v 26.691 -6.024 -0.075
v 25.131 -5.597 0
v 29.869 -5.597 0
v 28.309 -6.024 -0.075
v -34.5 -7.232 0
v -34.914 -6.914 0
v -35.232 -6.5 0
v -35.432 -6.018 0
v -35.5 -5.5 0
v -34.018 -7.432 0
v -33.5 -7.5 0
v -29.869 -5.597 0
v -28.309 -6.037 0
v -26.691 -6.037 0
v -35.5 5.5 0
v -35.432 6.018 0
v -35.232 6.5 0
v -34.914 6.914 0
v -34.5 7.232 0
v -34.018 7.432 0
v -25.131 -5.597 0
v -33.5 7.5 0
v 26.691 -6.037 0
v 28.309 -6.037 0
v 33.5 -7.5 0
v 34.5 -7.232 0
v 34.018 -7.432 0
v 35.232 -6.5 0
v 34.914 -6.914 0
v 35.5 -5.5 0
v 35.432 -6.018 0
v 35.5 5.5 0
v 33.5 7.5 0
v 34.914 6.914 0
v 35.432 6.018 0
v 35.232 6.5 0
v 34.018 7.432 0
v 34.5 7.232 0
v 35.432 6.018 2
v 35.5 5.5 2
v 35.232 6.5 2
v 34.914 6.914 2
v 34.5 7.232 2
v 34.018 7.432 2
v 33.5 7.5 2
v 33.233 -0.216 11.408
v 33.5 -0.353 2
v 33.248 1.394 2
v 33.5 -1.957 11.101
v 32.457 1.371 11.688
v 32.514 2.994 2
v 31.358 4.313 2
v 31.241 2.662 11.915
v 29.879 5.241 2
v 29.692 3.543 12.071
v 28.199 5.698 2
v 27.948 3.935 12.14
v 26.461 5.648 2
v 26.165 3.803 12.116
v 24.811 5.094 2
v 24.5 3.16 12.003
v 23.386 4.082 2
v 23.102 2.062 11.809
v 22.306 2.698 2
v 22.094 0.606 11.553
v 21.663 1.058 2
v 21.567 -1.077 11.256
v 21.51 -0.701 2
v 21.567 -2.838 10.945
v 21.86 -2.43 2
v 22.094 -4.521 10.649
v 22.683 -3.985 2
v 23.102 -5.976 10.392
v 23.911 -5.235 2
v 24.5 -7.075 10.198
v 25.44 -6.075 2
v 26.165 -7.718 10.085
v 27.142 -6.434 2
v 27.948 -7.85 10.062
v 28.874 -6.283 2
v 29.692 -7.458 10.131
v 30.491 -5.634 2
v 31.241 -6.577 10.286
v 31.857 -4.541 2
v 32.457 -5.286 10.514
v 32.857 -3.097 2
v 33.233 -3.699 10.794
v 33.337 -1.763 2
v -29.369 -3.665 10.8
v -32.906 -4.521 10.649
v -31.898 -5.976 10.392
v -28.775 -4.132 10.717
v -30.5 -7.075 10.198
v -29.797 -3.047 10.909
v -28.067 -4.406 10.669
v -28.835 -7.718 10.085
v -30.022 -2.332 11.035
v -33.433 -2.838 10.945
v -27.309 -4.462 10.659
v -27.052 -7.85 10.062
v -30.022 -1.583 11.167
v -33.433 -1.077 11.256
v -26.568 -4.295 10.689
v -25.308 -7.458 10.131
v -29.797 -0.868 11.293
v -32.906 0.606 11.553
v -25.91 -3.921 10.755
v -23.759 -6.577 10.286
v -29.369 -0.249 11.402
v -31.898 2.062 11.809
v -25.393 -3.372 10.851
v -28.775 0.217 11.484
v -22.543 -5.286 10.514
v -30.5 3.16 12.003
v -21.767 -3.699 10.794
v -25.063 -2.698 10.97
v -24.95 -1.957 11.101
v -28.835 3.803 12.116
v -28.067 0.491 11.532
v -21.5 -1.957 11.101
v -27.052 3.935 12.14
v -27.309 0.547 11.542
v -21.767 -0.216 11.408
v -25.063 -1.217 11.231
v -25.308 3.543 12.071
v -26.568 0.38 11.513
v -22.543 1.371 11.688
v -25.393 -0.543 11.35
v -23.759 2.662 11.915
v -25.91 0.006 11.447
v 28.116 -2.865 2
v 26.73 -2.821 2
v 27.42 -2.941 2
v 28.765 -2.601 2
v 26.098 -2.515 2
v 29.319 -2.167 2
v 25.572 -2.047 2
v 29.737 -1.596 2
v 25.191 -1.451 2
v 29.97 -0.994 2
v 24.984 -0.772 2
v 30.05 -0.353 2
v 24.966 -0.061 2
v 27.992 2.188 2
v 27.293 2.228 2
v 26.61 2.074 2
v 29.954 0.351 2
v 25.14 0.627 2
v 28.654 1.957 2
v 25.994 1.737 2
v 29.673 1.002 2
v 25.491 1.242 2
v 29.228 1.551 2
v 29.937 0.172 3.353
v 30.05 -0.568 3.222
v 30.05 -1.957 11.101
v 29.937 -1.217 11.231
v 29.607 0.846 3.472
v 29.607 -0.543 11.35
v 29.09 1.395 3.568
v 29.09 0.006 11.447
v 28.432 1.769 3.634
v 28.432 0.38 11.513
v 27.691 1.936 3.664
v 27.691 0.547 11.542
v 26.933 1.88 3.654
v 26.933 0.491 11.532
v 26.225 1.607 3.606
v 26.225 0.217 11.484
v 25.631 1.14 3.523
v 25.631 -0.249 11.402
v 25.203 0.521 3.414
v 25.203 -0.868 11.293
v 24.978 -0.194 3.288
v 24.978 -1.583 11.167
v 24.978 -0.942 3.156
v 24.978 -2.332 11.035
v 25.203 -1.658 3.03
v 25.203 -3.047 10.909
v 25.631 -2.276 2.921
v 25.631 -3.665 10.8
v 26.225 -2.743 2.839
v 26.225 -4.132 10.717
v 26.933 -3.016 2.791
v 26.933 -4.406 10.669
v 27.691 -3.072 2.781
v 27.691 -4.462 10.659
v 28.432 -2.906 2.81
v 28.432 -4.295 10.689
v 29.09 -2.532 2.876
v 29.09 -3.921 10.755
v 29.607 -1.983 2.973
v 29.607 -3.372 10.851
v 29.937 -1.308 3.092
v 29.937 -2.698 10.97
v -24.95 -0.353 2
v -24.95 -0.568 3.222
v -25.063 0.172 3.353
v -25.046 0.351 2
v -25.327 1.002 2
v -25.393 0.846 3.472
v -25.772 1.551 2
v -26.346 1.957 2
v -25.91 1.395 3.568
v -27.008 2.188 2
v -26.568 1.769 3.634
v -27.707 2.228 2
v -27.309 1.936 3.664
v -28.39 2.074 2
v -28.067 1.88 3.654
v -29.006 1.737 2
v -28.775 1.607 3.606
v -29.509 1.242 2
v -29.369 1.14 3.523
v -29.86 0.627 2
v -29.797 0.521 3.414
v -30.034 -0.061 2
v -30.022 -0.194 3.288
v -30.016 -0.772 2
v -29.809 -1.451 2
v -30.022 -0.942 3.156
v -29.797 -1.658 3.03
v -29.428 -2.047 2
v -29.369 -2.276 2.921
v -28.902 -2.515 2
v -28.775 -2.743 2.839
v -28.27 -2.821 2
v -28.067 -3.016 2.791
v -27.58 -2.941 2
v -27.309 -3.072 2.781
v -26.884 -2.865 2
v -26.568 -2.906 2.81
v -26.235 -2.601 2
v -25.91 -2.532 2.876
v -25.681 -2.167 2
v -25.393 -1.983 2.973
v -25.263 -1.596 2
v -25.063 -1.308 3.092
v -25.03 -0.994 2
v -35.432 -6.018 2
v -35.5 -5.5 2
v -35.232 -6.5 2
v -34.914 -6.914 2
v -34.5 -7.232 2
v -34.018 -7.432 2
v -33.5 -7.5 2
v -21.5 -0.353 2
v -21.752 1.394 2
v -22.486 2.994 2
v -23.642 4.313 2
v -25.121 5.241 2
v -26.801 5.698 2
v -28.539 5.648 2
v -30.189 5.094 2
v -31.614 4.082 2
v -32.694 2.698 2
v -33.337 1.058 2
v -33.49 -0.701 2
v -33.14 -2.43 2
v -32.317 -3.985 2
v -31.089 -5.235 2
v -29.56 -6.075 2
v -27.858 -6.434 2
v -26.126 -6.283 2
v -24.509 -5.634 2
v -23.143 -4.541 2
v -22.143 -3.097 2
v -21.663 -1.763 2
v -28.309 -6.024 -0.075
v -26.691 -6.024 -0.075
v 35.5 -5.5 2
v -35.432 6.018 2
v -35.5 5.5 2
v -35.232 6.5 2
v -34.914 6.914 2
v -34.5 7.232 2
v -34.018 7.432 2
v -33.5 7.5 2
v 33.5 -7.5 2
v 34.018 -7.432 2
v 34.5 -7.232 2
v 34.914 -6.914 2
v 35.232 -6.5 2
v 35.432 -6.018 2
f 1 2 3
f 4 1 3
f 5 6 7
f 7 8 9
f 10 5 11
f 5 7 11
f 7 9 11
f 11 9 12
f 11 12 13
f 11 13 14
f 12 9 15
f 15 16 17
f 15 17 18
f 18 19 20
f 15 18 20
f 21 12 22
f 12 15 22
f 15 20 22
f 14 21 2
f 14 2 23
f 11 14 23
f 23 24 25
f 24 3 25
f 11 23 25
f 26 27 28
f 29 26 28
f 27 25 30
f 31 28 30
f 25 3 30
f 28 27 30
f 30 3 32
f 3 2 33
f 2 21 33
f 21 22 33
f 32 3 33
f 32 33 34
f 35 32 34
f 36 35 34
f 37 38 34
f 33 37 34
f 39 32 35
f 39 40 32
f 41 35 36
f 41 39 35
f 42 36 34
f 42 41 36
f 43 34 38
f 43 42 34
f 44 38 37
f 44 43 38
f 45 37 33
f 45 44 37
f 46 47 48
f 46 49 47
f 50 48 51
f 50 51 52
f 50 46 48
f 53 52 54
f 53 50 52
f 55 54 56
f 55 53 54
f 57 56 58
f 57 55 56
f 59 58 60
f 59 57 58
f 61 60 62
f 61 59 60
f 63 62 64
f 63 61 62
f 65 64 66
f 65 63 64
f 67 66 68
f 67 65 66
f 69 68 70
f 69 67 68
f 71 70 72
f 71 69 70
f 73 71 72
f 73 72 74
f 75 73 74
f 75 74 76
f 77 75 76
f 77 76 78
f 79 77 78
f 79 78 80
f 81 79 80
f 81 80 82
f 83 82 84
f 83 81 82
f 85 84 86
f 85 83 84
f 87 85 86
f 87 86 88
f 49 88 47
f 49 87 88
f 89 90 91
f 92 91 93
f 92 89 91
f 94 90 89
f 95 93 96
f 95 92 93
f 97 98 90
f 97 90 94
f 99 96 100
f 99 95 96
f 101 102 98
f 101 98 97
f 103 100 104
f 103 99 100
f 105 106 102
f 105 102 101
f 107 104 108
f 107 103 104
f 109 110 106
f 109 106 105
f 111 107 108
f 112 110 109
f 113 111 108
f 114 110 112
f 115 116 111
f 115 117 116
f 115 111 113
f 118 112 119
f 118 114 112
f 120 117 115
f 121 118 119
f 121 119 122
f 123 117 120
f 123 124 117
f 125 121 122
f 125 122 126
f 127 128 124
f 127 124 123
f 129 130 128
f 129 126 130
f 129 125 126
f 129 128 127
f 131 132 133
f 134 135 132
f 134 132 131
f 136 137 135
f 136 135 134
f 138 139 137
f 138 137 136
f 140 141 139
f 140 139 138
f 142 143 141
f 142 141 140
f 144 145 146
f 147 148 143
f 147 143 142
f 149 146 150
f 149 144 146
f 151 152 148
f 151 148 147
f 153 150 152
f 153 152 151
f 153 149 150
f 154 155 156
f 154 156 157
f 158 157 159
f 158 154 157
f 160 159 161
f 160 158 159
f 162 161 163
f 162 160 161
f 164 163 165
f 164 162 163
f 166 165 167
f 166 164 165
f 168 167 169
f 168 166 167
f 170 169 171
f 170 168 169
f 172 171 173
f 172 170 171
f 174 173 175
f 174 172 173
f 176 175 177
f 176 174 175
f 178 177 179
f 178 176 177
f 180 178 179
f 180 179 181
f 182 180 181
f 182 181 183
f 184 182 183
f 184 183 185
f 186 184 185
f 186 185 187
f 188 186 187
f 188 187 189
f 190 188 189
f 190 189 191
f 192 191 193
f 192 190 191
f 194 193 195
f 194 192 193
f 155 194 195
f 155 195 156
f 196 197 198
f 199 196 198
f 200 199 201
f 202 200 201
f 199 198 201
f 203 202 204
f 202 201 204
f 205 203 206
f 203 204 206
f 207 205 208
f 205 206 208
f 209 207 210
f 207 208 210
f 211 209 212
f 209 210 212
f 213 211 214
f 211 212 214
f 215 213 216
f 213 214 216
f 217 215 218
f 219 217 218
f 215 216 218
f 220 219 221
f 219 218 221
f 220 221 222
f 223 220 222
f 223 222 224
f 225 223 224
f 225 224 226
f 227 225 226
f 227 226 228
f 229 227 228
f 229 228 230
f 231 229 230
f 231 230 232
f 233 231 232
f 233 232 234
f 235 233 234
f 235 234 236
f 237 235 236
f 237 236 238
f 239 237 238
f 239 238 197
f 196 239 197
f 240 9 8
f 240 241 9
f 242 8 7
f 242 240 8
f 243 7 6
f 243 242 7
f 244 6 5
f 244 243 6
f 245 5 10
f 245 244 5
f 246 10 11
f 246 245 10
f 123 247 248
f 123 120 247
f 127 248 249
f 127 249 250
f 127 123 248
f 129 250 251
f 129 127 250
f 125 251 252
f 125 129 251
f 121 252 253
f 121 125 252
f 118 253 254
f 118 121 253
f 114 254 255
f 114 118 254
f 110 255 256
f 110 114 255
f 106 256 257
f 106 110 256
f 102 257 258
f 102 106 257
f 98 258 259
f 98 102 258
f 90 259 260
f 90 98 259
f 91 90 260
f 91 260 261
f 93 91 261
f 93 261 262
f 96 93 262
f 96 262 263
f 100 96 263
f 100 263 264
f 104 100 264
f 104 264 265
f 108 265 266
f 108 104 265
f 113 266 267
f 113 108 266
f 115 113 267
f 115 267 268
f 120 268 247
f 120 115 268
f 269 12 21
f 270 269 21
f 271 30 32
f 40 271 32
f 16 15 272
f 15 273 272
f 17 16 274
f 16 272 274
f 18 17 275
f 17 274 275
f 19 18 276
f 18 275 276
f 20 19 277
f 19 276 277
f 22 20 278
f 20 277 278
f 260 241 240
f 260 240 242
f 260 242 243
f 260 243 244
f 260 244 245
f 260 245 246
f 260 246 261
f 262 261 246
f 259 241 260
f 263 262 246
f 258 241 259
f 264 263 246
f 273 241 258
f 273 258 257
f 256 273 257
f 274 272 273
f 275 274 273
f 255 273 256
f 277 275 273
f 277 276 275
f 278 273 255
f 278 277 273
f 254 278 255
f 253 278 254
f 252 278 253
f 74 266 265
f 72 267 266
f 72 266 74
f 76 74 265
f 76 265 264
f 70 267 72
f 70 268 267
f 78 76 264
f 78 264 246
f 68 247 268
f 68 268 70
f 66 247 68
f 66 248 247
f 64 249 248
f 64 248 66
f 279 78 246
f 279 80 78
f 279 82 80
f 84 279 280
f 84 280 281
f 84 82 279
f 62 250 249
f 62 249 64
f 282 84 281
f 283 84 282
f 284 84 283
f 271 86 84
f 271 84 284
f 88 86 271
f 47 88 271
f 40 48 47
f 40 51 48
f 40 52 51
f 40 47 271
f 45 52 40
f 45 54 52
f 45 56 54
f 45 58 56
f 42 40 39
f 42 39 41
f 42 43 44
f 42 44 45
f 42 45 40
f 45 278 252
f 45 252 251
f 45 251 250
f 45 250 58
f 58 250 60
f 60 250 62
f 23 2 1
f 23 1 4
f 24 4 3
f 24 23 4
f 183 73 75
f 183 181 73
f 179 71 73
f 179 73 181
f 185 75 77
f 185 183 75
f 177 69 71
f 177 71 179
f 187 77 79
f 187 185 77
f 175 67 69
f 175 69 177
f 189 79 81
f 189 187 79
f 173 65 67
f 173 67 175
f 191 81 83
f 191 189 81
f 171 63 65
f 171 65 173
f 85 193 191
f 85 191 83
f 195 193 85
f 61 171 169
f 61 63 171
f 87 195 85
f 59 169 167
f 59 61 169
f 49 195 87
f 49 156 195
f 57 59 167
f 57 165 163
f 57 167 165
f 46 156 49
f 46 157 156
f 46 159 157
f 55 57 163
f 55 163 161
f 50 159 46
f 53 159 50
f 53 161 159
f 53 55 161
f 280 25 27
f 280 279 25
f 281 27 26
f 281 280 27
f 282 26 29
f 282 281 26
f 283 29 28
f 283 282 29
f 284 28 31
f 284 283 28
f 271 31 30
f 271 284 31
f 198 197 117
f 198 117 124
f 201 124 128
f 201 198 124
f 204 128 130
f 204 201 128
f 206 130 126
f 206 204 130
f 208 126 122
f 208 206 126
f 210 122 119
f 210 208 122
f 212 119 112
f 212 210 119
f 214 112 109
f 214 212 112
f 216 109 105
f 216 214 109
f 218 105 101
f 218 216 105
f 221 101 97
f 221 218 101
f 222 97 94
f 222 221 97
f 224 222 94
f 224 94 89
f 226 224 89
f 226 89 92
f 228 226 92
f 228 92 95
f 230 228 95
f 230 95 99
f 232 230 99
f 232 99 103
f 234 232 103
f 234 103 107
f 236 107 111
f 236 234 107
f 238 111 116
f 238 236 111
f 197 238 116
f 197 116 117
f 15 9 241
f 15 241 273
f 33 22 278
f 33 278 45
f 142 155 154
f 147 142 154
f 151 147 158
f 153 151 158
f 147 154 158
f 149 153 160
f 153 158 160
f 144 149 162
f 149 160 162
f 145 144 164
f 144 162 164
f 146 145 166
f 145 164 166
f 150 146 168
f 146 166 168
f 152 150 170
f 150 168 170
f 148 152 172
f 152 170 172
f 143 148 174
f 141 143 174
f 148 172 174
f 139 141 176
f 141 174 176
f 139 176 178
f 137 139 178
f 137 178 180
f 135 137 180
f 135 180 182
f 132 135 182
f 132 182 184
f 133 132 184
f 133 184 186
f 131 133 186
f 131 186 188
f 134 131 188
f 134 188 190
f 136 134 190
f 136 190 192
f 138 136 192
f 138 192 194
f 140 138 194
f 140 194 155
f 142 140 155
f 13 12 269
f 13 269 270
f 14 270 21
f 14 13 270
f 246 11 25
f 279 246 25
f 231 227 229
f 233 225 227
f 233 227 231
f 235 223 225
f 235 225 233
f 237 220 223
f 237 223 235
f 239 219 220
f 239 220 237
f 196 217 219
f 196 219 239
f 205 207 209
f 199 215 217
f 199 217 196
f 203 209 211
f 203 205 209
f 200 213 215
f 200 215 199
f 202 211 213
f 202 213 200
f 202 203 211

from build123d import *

# Parameters (mm, degrees)
F0_W          = 71
F0_H          = 15
F1_DEPTH      = 2
F2_R          = 2
F4_R          = 6
F4_R_2        = 2.55
F5_DEPTH      = 8
F5_DEPTH_BACK = 2.3


with BuildPart() as f1:
    # F0 (on Top) → F1 (new body)
    with BuildSketch(Plane.XY):
        Rectangle(F0_W, F0_H)
    extrude(amount=F1_DEPTH)

    # F2
    f2_edges = [f1.edges().sort_by_distance(p)[0] for p in [
        (-35.5, 7.5, 1),
        (-35.5, -7.5, 1),
        (35.5, -7.5, 1),
        (35.5, 7.5, 1),
    ]]
    fillet(f2_edges, radius=F2_R)

    # F4 (on face) → F5 (join, two sides)
    with BuildSketch(Plane(origin=(0, -0.568173, 3.222268), x_dir=(1, 0, 0), z_dir=(0, -0.173648, 0.984808))) as f5_sk:
        with Locations((-27.5, 0)):
            Circle(F4_R)
        with Locations((-27.5, 0)):
            Circle(F4_R_2, mode=Mode.SUBTRACT)
        with Locations((27.5, 0)):
            Circle(F4_R)
        with Locations((27.5, 0)):
            Circle(F4_R_2, mode=Mode.SUBTRACT)
    extrude(amount=F5_DEPTH)
    extrude(f5_sk.sketch, amount=-F5_DEPTH_BACK)


solid = f1.part
